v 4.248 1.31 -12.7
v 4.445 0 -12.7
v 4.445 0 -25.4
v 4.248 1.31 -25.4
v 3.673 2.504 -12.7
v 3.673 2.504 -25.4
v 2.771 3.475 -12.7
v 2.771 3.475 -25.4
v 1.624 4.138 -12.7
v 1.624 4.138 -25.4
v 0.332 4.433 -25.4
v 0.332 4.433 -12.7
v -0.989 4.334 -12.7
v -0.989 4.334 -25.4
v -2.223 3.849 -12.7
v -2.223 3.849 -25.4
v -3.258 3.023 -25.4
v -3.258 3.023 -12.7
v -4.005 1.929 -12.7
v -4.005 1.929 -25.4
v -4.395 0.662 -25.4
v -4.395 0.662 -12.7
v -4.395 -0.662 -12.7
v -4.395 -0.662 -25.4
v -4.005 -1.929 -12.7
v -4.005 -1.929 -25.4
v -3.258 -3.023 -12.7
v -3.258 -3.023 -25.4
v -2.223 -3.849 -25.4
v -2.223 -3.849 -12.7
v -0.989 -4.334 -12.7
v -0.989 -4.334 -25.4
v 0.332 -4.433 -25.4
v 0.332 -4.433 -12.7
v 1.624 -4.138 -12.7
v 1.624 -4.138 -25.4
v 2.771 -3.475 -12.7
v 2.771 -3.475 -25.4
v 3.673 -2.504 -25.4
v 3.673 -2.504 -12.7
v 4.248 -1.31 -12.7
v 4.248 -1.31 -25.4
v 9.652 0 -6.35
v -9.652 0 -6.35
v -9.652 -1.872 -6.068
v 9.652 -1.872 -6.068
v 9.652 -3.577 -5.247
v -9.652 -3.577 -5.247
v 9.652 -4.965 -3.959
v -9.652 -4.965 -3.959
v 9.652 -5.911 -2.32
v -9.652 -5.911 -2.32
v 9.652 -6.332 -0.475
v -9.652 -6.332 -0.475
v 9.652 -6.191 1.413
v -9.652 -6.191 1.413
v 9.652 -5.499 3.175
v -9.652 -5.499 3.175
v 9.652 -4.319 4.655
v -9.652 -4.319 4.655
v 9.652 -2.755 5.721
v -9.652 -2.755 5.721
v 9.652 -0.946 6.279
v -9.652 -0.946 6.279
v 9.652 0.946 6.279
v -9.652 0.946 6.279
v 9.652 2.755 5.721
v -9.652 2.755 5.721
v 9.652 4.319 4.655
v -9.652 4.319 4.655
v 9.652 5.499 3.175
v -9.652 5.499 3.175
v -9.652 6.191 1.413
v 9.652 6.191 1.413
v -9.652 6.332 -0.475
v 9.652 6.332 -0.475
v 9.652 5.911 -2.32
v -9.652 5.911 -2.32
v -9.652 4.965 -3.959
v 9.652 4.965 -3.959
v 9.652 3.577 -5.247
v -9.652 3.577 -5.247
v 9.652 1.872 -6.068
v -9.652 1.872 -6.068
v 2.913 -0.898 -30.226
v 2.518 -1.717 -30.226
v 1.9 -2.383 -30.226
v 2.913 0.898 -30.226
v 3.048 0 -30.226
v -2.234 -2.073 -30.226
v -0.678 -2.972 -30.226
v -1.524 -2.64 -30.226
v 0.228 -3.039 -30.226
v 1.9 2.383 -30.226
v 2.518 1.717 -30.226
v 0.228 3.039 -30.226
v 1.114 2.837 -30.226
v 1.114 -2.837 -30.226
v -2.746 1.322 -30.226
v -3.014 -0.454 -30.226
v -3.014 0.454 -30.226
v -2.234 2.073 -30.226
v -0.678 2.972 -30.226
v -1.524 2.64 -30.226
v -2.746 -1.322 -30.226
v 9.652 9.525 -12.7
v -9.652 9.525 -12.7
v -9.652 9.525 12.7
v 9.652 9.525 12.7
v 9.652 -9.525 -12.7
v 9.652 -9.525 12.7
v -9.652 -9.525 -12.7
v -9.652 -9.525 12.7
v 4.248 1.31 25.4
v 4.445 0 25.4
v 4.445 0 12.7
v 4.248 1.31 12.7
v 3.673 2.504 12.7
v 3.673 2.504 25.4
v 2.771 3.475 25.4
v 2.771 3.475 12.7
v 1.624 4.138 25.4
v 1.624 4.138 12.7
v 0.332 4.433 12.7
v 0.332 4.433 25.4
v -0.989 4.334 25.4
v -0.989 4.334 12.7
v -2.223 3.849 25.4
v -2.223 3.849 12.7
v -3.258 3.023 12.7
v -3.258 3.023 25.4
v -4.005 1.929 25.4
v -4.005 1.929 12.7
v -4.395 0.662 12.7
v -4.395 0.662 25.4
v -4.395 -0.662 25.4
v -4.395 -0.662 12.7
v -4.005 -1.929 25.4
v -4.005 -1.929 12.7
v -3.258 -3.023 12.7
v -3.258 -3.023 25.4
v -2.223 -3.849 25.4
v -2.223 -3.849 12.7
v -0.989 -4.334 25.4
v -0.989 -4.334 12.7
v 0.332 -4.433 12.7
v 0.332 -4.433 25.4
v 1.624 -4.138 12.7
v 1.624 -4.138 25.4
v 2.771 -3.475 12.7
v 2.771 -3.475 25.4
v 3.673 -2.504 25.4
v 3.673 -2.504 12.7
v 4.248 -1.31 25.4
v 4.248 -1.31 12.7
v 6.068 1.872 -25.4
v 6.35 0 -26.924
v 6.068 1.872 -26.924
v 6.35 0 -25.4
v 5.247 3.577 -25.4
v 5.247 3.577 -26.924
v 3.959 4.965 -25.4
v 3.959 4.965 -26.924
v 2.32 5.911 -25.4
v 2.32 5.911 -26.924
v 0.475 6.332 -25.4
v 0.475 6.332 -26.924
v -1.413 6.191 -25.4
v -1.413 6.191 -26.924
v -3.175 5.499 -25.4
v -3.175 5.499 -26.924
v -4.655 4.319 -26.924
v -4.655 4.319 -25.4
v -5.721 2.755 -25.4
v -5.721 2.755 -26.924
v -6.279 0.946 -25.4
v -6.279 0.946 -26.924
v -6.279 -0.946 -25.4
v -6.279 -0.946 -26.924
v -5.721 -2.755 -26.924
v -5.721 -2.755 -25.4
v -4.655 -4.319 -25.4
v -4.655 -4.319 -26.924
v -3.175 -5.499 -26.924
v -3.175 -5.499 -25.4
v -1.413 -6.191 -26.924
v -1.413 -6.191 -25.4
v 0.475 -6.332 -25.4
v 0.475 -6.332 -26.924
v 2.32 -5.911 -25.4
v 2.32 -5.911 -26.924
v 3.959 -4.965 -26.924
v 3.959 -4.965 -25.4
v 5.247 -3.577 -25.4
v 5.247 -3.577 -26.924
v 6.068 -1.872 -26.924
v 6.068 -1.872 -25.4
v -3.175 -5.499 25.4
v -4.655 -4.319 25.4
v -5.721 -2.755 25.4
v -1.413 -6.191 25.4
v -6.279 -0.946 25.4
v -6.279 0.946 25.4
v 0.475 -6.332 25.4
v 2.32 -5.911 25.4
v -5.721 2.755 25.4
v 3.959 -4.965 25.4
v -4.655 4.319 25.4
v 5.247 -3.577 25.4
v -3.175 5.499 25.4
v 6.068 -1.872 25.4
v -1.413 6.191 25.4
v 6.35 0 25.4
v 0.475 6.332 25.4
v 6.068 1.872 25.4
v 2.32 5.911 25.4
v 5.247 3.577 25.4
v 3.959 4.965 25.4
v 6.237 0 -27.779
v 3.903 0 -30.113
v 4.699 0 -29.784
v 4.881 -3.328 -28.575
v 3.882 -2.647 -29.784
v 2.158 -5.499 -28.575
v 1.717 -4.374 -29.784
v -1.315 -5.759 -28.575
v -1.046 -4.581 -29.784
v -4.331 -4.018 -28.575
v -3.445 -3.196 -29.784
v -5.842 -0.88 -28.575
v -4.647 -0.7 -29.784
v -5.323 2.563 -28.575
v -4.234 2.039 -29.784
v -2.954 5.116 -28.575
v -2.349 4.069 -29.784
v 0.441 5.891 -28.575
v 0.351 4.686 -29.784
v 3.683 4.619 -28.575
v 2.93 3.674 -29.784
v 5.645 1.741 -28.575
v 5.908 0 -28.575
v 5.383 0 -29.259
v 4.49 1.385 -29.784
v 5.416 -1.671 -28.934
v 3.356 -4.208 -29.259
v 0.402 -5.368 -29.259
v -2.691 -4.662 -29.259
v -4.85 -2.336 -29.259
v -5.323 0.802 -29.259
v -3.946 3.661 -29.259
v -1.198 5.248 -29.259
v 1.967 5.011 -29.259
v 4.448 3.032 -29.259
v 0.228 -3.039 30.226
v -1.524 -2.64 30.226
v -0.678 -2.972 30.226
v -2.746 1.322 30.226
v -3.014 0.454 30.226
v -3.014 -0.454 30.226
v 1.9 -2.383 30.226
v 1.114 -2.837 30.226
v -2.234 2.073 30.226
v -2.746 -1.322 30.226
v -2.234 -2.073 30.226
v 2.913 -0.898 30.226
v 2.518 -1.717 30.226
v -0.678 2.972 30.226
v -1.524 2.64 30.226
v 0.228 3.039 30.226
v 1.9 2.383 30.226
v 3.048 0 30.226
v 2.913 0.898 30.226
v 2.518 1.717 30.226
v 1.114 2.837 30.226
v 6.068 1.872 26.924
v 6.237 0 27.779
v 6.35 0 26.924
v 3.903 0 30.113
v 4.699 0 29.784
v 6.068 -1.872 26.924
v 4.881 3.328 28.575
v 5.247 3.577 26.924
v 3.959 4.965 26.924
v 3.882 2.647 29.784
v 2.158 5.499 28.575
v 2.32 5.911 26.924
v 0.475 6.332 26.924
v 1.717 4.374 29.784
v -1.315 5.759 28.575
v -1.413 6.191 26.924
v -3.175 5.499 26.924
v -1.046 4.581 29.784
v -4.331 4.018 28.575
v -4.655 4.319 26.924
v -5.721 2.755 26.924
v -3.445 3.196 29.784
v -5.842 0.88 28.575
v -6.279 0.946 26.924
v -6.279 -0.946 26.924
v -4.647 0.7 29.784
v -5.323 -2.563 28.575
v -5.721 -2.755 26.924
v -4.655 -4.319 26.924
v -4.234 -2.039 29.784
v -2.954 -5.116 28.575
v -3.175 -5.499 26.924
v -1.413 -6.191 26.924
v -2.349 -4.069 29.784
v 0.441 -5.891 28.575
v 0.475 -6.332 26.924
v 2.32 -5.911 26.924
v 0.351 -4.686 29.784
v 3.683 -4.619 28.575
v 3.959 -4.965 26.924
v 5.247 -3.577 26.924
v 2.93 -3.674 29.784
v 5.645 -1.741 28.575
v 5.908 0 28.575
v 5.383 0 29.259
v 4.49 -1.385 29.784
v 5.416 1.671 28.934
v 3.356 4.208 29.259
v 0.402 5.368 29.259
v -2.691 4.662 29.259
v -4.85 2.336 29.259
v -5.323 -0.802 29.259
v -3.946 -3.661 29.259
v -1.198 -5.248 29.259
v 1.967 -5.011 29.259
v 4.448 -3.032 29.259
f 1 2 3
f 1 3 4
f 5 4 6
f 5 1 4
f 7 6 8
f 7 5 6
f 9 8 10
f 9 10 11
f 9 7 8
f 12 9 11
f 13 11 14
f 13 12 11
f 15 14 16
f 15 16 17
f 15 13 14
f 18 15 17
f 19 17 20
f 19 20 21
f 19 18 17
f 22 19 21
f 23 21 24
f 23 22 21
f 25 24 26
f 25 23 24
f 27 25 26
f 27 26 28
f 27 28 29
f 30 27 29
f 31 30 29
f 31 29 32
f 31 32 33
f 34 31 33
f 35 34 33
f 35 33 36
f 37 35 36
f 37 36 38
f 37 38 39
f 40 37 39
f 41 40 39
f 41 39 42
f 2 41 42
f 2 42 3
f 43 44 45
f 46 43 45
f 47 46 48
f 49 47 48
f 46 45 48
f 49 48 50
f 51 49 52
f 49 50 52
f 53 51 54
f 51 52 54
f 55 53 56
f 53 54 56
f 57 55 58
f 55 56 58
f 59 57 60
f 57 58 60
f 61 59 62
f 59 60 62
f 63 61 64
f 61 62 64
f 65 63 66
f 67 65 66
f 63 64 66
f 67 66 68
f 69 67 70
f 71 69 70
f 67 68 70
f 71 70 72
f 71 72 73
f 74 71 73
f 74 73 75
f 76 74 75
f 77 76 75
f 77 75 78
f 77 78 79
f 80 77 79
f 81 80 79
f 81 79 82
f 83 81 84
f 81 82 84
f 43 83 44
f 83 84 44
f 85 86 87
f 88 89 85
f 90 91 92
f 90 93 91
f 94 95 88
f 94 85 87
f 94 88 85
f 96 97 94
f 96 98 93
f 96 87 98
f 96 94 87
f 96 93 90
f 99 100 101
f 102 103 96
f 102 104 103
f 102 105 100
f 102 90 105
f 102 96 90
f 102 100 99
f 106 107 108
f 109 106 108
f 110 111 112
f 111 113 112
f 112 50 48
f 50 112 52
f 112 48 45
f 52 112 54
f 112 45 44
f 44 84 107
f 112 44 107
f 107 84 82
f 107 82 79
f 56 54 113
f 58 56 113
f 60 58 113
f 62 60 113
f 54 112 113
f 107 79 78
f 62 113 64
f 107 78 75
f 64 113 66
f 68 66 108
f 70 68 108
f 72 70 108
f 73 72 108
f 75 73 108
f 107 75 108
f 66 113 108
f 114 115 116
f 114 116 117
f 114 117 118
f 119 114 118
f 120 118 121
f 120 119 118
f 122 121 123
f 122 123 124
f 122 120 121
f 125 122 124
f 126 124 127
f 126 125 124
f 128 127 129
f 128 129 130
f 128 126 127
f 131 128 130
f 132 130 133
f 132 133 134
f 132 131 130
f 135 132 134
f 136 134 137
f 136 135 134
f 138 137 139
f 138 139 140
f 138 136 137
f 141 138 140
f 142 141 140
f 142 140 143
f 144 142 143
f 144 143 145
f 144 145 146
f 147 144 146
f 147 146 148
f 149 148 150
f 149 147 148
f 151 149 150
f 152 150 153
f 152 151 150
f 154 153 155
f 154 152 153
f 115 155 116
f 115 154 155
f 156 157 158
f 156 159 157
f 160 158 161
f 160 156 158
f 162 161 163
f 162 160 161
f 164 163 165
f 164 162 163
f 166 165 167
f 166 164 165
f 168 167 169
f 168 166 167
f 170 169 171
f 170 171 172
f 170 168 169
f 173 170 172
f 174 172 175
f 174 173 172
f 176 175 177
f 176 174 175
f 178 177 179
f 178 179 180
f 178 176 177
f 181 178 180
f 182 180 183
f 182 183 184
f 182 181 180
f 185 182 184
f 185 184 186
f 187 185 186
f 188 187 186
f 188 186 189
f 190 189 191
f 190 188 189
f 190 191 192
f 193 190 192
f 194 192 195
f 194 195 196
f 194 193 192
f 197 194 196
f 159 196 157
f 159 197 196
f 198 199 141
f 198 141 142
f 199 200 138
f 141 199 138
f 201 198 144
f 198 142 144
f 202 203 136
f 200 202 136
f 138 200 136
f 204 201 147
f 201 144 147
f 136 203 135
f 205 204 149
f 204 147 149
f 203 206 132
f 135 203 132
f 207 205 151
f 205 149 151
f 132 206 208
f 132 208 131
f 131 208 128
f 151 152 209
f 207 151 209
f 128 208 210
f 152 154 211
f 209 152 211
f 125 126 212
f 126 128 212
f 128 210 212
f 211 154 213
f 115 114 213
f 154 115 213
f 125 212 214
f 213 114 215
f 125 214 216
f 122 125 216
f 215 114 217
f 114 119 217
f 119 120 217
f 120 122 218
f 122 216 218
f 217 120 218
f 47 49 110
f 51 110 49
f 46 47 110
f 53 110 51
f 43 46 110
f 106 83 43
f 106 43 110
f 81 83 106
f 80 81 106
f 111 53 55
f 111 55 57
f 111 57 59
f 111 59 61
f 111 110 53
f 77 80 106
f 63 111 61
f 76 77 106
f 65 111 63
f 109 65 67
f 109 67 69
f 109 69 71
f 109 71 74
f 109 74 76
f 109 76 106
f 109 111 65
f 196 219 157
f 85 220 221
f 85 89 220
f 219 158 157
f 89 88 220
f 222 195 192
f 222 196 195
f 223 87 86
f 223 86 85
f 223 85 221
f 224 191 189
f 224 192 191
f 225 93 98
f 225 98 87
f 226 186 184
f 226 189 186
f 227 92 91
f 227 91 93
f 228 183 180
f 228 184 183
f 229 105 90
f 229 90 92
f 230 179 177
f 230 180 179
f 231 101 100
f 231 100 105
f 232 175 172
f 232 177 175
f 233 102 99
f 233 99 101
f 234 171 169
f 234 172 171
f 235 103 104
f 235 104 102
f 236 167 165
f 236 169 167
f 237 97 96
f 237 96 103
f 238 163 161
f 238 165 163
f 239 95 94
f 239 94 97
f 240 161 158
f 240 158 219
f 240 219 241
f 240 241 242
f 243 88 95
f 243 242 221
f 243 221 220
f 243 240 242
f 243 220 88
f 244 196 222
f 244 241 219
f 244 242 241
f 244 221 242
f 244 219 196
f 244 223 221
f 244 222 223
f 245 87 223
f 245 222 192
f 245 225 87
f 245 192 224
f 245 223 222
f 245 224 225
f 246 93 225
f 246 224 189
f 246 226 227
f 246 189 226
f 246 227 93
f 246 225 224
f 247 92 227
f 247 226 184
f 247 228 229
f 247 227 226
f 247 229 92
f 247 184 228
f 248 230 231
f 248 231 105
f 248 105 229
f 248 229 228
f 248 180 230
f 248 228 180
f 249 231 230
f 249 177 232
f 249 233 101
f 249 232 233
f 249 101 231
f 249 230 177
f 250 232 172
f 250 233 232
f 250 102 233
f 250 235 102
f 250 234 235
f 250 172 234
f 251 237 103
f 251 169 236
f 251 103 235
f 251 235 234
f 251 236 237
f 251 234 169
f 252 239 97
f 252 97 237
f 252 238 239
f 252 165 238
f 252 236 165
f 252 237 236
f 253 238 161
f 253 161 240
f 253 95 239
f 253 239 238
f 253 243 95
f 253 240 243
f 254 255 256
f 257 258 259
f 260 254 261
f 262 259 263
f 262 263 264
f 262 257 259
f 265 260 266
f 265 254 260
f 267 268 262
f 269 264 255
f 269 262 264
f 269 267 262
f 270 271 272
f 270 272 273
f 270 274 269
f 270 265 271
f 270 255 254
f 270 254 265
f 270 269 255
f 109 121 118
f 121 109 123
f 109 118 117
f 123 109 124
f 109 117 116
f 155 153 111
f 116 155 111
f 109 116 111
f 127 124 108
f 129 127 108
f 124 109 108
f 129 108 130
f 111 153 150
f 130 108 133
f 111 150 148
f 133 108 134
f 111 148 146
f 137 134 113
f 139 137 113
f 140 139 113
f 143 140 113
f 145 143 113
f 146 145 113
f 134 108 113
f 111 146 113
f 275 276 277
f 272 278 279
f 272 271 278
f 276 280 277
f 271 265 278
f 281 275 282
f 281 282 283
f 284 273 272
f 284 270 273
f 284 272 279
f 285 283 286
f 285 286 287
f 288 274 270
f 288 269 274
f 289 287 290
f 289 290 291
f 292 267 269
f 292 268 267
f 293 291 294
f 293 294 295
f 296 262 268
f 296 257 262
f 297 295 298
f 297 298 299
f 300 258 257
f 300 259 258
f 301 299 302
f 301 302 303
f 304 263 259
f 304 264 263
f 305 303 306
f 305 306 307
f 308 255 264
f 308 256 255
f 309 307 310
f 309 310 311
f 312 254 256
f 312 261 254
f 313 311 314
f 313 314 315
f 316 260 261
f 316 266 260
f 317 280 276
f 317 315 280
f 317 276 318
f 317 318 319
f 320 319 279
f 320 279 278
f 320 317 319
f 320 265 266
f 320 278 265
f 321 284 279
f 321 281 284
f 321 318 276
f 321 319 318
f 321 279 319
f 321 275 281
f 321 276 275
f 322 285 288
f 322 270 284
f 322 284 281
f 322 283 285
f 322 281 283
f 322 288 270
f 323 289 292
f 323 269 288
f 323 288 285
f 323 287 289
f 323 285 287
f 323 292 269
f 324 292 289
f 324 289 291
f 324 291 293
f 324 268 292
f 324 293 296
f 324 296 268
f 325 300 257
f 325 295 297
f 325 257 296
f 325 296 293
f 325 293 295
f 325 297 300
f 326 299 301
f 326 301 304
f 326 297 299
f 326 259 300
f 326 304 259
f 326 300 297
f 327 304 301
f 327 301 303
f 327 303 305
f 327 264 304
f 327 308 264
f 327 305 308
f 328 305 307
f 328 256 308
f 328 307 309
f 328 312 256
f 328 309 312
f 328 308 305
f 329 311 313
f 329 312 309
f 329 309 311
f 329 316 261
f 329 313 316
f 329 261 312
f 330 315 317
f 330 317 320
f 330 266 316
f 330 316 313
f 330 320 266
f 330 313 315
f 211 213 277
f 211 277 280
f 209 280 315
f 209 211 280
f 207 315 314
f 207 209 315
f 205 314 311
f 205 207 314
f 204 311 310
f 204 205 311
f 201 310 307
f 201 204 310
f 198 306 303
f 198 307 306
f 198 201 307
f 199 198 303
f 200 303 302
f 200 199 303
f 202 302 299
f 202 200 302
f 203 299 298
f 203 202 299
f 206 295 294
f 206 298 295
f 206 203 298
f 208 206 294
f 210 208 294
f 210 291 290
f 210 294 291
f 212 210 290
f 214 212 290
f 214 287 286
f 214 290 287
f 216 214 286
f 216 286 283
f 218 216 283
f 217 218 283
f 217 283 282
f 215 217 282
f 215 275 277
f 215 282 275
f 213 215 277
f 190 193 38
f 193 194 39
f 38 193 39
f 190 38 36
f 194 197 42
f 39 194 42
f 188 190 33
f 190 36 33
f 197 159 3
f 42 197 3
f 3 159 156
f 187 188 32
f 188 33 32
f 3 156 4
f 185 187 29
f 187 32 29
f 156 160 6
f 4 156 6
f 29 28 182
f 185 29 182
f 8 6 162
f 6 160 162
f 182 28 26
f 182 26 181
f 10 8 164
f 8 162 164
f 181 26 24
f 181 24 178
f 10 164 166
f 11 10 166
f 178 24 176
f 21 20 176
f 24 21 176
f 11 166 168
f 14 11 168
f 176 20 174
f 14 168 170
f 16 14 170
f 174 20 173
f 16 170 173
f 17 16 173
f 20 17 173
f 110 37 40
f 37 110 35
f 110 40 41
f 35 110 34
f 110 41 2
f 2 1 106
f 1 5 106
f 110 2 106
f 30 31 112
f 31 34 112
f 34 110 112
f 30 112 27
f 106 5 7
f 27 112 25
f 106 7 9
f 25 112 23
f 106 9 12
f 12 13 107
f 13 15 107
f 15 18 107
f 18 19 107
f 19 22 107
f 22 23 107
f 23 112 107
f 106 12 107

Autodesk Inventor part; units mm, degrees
ref_plane "YZ Plane" through (0, 0, 0) normal (1, 0, 0) x (0, 1, 0)
ref_plane "XZ Plane" through (0, 0, 0) normal (0, 1, 0) x (-1, 0, 0)
ref_plane "XY Plane" through (0, 0, 0) normal (0, 0, 1) x (1, 0, 0)
sketch "Sketch1" plane through (0, 0, 0) normal (0, 0, 1) x (1, 0, 0)
  circle A0 centre (0, 0) radius 4.445
  dimension "d0" = 8.89
extrude "Extrusion1" add sketch "Sketch1" along normal mid plane 50.8
sketch "Sketch2" plane through (0, 0, 25.4) normal (0, 0, 1) x (1, 0, 0)
  circle A0 centre (0, 0) radius 6.35
  dimension "d3" = 12.7
extrude "Extrusion2" add sketch "Sketch2" along normal blind 4.826
fillet "Fillet1" radius 3.302 1 edges at (-6.35, 0, 30.226)
mirror "Mirror1" about plane through (0, 0, 0) normal (0, 0, 1) of "Extrusion2", "Fillet1"
sketch "Sketch3" plane through (0, 0, 0) normal (1, 0, 0) x (0, 1, 0)
  line L0 (-9.525, -12.7) -> (9.525, -12.7)
  line L1 (9.525, -12.7) -> (9.525, 12.7)
  line L2 (9.525, 12.7) -> (-9.525, 12.7)
  line L3 (-9.525, 12.7) -> (-9.525, -12.7)
  line L4 (-9.525, -12.7) -> (9.525, 12.7) construction
  line L5 (9.525, -12.7) -> (-9.525, 12.7) construction
  point P0 (0, 0)
  dimension "d7" = 19.05
  dimension "d8" = 25.4
extrude "Extrusion3" add sketch "Sketch3" along normal mid plane 19.304
sketch "Sketch4" plane through (9.652, 0, 0) normal (1, 0, 0) x (0, 0, -1)
  point P0 (0, 0)
  point P1 (0, 0)
hole "Hole1" at (9.652, 0, 0) direction (-1, 0, 0) diameter 12.7 end through all
properties part number "Insert"
